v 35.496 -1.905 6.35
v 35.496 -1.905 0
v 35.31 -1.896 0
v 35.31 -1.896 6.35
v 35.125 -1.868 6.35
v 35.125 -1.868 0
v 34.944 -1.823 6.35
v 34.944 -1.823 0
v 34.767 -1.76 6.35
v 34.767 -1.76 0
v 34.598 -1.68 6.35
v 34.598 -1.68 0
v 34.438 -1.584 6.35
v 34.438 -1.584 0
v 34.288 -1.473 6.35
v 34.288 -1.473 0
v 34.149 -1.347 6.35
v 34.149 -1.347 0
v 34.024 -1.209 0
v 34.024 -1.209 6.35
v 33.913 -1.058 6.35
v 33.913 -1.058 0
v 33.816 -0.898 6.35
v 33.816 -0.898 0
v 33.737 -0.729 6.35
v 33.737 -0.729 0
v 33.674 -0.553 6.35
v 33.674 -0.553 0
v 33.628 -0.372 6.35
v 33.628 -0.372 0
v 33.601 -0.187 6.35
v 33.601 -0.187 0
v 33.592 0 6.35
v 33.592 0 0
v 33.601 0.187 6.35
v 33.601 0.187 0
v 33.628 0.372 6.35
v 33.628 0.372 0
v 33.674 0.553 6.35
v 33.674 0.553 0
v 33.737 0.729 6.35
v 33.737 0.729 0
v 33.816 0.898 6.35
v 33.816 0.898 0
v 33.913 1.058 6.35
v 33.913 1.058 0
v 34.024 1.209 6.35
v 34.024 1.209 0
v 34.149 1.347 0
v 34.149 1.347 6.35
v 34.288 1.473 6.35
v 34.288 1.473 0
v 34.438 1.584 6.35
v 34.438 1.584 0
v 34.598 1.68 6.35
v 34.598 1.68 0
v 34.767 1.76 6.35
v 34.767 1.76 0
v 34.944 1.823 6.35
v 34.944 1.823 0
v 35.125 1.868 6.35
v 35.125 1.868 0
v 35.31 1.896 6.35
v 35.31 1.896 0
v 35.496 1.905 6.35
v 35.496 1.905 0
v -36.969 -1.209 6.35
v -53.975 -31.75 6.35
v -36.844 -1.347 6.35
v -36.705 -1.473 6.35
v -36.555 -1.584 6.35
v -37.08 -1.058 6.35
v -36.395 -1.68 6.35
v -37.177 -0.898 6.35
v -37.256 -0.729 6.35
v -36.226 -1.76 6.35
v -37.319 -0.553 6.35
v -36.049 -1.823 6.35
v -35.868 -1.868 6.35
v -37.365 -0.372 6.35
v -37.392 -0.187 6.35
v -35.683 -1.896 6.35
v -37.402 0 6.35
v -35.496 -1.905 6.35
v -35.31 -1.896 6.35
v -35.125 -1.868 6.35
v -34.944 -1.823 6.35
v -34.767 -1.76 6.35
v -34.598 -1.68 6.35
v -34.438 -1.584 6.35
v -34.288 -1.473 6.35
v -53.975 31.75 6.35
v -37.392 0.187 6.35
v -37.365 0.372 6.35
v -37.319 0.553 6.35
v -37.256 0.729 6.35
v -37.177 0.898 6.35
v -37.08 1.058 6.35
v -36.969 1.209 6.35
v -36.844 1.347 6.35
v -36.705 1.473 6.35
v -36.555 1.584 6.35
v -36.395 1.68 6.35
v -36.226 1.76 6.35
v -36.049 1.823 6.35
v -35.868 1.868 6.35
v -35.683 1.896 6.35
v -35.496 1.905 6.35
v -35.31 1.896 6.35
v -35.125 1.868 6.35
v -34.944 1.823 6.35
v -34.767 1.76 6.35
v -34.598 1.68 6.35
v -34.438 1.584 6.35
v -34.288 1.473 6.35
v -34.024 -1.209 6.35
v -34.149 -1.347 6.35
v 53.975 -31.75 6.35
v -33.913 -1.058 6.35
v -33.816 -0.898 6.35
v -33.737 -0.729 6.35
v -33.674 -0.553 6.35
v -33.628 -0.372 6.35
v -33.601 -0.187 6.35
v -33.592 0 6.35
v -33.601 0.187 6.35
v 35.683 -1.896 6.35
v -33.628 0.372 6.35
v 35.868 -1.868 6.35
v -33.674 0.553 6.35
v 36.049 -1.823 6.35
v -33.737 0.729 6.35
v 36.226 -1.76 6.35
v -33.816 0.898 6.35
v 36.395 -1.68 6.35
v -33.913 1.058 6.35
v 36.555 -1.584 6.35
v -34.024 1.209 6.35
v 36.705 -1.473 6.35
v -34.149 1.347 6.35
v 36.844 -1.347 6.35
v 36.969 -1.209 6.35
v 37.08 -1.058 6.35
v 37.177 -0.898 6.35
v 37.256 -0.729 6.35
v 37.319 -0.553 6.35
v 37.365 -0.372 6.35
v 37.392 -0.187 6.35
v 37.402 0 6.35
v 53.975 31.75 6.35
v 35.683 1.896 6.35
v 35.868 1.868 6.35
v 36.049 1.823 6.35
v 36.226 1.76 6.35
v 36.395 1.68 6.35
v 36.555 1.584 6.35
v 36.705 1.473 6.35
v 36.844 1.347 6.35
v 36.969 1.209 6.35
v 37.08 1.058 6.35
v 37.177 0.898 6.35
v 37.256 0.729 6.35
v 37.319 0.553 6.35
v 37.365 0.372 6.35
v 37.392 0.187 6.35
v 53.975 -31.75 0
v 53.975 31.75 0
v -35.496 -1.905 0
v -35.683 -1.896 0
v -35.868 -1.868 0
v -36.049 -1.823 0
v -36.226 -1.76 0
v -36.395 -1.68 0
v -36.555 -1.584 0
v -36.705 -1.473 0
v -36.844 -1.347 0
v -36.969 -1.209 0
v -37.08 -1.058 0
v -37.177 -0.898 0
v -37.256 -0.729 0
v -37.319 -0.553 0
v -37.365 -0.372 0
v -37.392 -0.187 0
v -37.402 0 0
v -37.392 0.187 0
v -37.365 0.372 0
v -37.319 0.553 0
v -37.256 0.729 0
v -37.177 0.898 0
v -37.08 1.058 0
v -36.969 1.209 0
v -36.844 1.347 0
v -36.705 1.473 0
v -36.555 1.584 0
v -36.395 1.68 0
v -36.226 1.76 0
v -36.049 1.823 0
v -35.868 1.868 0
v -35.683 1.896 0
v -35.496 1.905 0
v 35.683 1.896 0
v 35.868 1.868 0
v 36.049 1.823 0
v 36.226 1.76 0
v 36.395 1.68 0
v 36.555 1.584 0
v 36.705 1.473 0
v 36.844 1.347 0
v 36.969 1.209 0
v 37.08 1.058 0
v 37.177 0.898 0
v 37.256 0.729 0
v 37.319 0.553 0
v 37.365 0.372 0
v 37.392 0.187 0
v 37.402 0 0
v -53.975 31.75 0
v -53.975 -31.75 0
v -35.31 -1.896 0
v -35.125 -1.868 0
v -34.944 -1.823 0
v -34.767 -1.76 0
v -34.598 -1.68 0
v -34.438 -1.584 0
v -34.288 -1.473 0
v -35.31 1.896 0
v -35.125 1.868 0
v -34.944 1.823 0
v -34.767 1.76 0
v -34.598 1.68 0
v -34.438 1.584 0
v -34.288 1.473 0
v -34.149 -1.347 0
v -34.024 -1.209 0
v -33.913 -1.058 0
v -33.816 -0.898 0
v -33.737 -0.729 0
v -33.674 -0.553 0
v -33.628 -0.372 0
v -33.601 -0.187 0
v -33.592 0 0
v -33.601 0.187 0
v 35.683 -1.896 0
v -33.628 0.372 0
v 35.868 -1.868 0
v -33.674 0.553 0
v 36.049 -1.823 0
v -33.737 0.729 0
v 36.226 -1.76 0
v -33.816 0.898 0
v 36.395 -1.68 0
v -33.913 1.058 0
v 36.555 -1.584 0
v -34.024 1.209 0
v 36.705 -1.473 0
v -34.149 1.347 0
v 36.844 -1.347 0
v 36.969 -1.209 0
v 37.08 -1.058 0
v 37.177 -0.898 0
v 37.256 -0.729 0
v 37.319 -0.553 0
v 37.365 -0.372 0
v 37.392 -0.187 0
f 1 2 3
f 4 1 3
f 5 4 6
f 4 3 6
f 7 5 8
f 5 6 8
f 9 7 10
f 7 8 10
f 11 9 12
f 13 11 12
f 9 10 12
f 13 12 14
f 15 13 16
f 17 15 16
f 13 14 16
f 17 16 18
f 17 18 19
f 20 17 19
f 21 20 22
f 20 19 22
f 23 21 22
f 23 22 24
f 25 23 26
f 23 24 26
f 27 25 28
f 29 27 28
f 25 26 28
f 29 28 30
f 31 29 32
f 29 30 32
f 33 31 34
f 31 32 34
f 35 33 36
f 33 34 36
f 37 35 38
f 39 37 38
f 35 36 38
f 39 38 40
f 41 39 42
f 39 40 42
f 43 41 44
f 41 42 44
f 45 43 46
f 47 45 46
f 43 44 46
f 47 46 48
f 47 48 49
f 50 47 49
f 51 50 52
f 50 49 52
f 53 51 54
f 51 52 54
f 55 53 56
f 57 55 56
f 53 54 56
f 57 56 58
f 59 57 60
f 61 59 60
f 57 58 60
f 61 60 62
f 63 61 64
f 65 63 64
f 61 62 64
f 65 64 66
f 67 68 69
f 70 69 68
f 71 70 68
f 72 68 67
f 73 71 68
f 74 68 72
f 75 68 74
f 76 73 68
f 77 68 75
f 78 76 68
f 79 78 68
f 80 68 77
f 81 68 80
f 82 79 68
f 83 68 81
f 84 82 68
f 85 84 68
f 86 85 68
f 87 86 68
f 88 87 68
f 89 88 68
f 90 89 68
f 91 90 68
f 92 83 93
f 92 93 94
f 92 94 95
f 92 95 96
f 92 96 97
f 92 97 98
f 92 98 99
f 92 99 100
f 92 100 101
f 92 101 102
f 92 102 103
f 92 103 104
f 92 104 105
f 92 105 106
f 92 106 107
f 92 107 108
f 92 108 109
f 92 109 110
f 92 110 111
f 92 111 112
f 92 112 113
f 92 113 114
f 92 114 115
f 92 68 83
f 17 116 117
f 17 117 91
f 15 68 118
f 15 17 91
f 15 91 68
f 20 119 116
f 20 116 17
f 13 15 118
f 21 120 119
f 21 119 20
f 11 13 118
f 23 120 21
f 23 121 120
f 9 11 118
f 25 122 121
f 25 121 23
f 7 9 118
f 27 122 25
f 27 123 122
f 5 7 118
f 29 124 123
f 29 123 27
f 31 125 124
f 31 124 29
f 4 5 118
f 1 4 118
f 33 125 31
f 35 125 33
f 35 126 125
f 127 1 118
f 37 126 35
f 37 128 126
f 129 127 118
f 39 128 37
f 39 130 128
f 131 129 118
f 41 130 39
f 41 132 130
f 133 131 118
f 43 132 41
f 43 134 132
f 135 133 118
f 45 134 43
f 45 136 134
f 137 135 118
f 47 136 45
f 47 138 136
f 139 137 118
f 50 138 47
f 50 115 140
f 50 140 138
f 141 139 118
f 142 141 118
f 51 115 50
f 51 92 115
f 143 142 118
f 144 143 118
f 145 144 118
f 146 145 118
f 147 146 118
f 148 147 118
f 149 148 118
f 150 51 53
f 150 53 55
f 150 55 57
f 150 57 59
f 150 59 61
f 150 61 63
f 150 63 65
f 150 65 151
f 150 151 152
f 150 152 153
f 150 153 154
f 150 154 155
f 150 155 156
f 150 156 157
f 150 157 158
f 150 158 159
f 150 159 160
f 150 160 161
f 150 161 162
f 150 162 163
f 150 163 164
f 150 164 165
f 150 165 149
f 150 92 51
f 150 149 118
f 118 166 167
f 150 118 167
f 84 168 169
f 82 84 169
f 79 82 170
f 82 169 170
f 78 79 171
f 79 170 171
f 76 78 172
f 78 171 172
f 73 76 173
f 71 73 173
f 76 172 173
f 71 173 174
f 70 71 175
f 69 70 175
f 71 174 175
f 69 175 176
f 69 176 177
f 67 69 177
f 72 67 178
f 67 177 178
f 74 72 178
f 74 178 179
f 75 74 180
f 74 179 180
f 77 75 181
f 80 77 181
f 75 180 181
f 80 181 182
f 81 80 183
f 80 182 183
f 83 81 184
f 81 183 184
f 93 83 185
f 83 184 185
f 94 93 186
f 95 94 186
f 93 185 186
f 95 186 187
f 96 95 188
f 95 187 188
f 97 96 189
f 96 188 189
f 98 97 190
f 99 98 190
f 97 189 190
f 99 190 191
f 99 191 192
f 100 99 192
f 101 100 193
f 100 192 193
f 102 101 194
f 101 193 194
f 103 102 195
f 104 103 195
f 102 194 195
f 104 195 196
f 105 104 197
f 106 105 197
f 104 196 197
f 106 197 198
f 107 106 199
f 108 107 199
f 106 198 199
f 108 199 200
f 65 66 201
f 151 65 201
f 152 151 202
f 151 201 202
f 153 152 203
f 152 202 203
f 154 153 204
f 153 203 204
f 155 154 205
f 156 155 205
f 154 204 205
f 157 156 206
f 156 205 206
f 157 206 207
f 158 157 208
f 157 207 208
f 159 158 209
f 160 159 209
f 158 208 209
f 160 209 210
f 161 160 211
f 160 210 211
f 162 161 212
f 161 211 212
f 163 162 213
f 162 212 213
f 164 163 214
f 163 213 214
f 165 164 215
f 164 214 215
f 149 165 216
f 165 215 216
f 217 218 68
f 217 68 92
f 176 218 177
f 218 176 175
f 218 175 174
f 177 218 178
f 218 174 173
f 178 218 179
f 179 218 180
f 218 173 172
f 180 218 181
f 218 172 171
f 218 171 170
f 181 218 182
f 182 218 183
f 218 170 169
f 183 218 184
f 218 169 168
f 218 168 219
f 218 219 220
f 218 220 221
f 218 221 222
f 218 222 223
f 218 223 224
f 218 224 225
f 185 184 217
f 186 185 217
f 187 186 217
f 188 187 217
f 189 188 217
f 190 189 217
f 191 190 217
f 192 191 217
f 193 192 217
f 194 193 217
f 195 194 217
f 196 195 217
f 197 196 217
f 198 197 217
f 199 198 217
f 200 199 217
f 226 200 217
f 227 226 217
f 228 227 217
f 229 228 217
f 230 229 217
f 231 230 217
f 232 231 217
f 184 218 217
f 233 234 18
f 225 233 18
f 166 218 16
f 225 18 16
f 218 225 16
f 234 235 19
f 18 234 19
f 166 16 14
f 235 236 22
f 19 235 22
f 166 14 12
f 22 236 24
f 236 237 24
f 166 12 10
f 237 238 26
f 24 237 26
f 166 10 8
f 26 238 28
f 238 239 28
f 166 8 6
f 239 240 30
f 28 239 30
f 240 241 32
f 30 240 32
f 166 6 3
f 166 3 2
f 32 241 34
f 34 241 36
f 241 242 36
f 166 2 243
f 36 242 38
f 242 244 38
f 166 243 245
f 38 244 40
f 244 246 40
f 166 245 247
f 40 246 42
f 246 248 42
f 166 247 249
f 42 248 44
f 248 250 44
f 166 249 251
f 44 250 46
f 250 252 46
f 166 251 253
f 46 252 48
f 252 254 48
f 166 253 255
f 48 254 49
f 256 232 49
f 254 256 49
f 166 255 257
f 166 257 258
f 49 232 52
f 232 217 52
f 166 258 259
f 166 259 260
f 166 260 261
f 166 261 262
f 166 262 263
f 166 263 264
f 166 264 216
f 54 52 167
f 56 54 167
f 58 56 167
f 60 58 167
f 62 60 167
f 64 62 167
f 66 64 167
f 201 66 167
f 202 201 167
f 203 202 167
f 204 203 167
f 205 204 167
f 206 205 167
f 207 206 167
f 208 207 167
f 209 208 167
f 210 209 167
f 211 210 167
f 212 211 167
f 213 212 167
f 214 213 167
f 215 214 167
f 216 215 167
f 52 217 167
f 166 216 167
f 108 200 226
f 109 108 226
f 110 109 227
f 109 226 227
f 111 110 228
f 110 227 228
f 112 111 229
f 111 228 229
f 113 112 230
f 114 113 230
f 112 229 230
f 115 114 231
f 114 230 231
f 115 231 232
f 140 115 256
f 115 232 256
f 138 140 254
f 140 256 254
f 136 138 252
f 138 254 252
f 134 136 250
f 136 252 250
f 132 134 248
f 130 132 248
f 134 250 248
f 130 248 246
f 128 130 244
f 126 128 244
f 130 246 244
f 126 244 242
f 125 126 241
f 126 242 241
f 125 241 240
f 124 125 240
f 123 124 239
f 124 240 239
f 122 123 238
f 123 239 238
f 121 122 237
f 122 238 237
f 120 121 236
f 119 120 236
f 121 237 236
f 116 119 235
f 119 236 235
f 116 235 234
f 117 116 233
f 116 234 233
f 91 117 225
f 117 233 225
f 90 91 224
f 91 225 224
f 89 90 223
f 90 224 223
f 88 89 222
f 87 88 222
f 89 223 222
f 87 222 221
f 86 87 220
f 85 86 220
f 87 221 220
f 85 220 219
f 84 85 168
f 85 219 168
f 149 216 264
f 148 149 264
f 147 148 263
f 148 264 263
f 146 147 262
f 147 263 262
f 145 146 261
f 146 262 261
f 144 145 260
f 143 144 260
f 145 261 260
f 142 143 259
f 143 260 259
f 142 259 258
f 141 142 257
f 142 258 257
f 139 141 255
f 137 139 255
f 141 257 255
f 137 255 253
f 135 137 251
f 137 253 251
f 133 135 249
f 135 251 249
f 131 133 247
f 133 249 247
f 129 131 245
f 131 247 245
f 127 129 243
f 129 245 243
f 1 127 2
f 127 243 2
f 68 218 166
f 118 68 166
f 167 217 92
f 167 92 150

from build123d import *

# Parameters (mm, degrees)
F0_W     = 107.95
F0_H     = 63.5
F1_DEPTH = 6.35


with BuildPart() as f1:
    # F0 (on Top) → F1 (new body)
    with BuildSketch(Plane.XY):
        Rectangle(F0_W, F0_H)
        with BuildLine():
            Line((-35.4965, 18.534034), (35.4965, 18.534034))
            Line((35.4965, 18.534034), (35.4965, 1.905))
            ThreePointArc((35.4965, 1.905), (36.843538, 1.347038), (37.4015, 0))
            ThreePointArc((37.4015, 0), (36.843538, -1.347038), (35.4965, -1.905))
            Line((35.4965, -1.905), (35.4965, -18.534034))
            Line((35.4965, -18.534034), (-35.4965, -18.534034))
            Line((-35.4965, -18.534034), (-35.4965, -1.905))
            ThreePointArc((-35.4965, -1.905), (-37.4015, 0), (-35.4965, 1.905))
            Line((-35.4965, 1.905), (-35.4965, 18.534034))
        make_face(mode=Mode.SUBTRACT)
        with BuildLine():
            Line((35.4965, 1.905), (35.4965, 18.534034))
            Line((35.4965, 18.534034), (-35.4965, 18.534034))
            Line((-35.4965, 18.534034), (-35.4965, 1.905))
            ThreePointArc((-35.4965, 1.905), (-34.149462, 1.347038), (-33.5915, 0))
            ThreePointArc((-33.5915, 0), (-34.149462, -1.347038), (-35.4965, -1.905))
            Line((-35.4965, -1.905), (-35.4965, -18.534034))
            Line((-35.4965, -18.534034), (35.4965, -18.534034))
            Line((35.4965, -18.534034), (35.4965, -1.905))
            ThreePointArc((35.4965, -1.905), (33.5915, 0), (35.4965, 1.905))
        make_face()
    extrude(amount=F1_DEPTH)


solid = f1.part
